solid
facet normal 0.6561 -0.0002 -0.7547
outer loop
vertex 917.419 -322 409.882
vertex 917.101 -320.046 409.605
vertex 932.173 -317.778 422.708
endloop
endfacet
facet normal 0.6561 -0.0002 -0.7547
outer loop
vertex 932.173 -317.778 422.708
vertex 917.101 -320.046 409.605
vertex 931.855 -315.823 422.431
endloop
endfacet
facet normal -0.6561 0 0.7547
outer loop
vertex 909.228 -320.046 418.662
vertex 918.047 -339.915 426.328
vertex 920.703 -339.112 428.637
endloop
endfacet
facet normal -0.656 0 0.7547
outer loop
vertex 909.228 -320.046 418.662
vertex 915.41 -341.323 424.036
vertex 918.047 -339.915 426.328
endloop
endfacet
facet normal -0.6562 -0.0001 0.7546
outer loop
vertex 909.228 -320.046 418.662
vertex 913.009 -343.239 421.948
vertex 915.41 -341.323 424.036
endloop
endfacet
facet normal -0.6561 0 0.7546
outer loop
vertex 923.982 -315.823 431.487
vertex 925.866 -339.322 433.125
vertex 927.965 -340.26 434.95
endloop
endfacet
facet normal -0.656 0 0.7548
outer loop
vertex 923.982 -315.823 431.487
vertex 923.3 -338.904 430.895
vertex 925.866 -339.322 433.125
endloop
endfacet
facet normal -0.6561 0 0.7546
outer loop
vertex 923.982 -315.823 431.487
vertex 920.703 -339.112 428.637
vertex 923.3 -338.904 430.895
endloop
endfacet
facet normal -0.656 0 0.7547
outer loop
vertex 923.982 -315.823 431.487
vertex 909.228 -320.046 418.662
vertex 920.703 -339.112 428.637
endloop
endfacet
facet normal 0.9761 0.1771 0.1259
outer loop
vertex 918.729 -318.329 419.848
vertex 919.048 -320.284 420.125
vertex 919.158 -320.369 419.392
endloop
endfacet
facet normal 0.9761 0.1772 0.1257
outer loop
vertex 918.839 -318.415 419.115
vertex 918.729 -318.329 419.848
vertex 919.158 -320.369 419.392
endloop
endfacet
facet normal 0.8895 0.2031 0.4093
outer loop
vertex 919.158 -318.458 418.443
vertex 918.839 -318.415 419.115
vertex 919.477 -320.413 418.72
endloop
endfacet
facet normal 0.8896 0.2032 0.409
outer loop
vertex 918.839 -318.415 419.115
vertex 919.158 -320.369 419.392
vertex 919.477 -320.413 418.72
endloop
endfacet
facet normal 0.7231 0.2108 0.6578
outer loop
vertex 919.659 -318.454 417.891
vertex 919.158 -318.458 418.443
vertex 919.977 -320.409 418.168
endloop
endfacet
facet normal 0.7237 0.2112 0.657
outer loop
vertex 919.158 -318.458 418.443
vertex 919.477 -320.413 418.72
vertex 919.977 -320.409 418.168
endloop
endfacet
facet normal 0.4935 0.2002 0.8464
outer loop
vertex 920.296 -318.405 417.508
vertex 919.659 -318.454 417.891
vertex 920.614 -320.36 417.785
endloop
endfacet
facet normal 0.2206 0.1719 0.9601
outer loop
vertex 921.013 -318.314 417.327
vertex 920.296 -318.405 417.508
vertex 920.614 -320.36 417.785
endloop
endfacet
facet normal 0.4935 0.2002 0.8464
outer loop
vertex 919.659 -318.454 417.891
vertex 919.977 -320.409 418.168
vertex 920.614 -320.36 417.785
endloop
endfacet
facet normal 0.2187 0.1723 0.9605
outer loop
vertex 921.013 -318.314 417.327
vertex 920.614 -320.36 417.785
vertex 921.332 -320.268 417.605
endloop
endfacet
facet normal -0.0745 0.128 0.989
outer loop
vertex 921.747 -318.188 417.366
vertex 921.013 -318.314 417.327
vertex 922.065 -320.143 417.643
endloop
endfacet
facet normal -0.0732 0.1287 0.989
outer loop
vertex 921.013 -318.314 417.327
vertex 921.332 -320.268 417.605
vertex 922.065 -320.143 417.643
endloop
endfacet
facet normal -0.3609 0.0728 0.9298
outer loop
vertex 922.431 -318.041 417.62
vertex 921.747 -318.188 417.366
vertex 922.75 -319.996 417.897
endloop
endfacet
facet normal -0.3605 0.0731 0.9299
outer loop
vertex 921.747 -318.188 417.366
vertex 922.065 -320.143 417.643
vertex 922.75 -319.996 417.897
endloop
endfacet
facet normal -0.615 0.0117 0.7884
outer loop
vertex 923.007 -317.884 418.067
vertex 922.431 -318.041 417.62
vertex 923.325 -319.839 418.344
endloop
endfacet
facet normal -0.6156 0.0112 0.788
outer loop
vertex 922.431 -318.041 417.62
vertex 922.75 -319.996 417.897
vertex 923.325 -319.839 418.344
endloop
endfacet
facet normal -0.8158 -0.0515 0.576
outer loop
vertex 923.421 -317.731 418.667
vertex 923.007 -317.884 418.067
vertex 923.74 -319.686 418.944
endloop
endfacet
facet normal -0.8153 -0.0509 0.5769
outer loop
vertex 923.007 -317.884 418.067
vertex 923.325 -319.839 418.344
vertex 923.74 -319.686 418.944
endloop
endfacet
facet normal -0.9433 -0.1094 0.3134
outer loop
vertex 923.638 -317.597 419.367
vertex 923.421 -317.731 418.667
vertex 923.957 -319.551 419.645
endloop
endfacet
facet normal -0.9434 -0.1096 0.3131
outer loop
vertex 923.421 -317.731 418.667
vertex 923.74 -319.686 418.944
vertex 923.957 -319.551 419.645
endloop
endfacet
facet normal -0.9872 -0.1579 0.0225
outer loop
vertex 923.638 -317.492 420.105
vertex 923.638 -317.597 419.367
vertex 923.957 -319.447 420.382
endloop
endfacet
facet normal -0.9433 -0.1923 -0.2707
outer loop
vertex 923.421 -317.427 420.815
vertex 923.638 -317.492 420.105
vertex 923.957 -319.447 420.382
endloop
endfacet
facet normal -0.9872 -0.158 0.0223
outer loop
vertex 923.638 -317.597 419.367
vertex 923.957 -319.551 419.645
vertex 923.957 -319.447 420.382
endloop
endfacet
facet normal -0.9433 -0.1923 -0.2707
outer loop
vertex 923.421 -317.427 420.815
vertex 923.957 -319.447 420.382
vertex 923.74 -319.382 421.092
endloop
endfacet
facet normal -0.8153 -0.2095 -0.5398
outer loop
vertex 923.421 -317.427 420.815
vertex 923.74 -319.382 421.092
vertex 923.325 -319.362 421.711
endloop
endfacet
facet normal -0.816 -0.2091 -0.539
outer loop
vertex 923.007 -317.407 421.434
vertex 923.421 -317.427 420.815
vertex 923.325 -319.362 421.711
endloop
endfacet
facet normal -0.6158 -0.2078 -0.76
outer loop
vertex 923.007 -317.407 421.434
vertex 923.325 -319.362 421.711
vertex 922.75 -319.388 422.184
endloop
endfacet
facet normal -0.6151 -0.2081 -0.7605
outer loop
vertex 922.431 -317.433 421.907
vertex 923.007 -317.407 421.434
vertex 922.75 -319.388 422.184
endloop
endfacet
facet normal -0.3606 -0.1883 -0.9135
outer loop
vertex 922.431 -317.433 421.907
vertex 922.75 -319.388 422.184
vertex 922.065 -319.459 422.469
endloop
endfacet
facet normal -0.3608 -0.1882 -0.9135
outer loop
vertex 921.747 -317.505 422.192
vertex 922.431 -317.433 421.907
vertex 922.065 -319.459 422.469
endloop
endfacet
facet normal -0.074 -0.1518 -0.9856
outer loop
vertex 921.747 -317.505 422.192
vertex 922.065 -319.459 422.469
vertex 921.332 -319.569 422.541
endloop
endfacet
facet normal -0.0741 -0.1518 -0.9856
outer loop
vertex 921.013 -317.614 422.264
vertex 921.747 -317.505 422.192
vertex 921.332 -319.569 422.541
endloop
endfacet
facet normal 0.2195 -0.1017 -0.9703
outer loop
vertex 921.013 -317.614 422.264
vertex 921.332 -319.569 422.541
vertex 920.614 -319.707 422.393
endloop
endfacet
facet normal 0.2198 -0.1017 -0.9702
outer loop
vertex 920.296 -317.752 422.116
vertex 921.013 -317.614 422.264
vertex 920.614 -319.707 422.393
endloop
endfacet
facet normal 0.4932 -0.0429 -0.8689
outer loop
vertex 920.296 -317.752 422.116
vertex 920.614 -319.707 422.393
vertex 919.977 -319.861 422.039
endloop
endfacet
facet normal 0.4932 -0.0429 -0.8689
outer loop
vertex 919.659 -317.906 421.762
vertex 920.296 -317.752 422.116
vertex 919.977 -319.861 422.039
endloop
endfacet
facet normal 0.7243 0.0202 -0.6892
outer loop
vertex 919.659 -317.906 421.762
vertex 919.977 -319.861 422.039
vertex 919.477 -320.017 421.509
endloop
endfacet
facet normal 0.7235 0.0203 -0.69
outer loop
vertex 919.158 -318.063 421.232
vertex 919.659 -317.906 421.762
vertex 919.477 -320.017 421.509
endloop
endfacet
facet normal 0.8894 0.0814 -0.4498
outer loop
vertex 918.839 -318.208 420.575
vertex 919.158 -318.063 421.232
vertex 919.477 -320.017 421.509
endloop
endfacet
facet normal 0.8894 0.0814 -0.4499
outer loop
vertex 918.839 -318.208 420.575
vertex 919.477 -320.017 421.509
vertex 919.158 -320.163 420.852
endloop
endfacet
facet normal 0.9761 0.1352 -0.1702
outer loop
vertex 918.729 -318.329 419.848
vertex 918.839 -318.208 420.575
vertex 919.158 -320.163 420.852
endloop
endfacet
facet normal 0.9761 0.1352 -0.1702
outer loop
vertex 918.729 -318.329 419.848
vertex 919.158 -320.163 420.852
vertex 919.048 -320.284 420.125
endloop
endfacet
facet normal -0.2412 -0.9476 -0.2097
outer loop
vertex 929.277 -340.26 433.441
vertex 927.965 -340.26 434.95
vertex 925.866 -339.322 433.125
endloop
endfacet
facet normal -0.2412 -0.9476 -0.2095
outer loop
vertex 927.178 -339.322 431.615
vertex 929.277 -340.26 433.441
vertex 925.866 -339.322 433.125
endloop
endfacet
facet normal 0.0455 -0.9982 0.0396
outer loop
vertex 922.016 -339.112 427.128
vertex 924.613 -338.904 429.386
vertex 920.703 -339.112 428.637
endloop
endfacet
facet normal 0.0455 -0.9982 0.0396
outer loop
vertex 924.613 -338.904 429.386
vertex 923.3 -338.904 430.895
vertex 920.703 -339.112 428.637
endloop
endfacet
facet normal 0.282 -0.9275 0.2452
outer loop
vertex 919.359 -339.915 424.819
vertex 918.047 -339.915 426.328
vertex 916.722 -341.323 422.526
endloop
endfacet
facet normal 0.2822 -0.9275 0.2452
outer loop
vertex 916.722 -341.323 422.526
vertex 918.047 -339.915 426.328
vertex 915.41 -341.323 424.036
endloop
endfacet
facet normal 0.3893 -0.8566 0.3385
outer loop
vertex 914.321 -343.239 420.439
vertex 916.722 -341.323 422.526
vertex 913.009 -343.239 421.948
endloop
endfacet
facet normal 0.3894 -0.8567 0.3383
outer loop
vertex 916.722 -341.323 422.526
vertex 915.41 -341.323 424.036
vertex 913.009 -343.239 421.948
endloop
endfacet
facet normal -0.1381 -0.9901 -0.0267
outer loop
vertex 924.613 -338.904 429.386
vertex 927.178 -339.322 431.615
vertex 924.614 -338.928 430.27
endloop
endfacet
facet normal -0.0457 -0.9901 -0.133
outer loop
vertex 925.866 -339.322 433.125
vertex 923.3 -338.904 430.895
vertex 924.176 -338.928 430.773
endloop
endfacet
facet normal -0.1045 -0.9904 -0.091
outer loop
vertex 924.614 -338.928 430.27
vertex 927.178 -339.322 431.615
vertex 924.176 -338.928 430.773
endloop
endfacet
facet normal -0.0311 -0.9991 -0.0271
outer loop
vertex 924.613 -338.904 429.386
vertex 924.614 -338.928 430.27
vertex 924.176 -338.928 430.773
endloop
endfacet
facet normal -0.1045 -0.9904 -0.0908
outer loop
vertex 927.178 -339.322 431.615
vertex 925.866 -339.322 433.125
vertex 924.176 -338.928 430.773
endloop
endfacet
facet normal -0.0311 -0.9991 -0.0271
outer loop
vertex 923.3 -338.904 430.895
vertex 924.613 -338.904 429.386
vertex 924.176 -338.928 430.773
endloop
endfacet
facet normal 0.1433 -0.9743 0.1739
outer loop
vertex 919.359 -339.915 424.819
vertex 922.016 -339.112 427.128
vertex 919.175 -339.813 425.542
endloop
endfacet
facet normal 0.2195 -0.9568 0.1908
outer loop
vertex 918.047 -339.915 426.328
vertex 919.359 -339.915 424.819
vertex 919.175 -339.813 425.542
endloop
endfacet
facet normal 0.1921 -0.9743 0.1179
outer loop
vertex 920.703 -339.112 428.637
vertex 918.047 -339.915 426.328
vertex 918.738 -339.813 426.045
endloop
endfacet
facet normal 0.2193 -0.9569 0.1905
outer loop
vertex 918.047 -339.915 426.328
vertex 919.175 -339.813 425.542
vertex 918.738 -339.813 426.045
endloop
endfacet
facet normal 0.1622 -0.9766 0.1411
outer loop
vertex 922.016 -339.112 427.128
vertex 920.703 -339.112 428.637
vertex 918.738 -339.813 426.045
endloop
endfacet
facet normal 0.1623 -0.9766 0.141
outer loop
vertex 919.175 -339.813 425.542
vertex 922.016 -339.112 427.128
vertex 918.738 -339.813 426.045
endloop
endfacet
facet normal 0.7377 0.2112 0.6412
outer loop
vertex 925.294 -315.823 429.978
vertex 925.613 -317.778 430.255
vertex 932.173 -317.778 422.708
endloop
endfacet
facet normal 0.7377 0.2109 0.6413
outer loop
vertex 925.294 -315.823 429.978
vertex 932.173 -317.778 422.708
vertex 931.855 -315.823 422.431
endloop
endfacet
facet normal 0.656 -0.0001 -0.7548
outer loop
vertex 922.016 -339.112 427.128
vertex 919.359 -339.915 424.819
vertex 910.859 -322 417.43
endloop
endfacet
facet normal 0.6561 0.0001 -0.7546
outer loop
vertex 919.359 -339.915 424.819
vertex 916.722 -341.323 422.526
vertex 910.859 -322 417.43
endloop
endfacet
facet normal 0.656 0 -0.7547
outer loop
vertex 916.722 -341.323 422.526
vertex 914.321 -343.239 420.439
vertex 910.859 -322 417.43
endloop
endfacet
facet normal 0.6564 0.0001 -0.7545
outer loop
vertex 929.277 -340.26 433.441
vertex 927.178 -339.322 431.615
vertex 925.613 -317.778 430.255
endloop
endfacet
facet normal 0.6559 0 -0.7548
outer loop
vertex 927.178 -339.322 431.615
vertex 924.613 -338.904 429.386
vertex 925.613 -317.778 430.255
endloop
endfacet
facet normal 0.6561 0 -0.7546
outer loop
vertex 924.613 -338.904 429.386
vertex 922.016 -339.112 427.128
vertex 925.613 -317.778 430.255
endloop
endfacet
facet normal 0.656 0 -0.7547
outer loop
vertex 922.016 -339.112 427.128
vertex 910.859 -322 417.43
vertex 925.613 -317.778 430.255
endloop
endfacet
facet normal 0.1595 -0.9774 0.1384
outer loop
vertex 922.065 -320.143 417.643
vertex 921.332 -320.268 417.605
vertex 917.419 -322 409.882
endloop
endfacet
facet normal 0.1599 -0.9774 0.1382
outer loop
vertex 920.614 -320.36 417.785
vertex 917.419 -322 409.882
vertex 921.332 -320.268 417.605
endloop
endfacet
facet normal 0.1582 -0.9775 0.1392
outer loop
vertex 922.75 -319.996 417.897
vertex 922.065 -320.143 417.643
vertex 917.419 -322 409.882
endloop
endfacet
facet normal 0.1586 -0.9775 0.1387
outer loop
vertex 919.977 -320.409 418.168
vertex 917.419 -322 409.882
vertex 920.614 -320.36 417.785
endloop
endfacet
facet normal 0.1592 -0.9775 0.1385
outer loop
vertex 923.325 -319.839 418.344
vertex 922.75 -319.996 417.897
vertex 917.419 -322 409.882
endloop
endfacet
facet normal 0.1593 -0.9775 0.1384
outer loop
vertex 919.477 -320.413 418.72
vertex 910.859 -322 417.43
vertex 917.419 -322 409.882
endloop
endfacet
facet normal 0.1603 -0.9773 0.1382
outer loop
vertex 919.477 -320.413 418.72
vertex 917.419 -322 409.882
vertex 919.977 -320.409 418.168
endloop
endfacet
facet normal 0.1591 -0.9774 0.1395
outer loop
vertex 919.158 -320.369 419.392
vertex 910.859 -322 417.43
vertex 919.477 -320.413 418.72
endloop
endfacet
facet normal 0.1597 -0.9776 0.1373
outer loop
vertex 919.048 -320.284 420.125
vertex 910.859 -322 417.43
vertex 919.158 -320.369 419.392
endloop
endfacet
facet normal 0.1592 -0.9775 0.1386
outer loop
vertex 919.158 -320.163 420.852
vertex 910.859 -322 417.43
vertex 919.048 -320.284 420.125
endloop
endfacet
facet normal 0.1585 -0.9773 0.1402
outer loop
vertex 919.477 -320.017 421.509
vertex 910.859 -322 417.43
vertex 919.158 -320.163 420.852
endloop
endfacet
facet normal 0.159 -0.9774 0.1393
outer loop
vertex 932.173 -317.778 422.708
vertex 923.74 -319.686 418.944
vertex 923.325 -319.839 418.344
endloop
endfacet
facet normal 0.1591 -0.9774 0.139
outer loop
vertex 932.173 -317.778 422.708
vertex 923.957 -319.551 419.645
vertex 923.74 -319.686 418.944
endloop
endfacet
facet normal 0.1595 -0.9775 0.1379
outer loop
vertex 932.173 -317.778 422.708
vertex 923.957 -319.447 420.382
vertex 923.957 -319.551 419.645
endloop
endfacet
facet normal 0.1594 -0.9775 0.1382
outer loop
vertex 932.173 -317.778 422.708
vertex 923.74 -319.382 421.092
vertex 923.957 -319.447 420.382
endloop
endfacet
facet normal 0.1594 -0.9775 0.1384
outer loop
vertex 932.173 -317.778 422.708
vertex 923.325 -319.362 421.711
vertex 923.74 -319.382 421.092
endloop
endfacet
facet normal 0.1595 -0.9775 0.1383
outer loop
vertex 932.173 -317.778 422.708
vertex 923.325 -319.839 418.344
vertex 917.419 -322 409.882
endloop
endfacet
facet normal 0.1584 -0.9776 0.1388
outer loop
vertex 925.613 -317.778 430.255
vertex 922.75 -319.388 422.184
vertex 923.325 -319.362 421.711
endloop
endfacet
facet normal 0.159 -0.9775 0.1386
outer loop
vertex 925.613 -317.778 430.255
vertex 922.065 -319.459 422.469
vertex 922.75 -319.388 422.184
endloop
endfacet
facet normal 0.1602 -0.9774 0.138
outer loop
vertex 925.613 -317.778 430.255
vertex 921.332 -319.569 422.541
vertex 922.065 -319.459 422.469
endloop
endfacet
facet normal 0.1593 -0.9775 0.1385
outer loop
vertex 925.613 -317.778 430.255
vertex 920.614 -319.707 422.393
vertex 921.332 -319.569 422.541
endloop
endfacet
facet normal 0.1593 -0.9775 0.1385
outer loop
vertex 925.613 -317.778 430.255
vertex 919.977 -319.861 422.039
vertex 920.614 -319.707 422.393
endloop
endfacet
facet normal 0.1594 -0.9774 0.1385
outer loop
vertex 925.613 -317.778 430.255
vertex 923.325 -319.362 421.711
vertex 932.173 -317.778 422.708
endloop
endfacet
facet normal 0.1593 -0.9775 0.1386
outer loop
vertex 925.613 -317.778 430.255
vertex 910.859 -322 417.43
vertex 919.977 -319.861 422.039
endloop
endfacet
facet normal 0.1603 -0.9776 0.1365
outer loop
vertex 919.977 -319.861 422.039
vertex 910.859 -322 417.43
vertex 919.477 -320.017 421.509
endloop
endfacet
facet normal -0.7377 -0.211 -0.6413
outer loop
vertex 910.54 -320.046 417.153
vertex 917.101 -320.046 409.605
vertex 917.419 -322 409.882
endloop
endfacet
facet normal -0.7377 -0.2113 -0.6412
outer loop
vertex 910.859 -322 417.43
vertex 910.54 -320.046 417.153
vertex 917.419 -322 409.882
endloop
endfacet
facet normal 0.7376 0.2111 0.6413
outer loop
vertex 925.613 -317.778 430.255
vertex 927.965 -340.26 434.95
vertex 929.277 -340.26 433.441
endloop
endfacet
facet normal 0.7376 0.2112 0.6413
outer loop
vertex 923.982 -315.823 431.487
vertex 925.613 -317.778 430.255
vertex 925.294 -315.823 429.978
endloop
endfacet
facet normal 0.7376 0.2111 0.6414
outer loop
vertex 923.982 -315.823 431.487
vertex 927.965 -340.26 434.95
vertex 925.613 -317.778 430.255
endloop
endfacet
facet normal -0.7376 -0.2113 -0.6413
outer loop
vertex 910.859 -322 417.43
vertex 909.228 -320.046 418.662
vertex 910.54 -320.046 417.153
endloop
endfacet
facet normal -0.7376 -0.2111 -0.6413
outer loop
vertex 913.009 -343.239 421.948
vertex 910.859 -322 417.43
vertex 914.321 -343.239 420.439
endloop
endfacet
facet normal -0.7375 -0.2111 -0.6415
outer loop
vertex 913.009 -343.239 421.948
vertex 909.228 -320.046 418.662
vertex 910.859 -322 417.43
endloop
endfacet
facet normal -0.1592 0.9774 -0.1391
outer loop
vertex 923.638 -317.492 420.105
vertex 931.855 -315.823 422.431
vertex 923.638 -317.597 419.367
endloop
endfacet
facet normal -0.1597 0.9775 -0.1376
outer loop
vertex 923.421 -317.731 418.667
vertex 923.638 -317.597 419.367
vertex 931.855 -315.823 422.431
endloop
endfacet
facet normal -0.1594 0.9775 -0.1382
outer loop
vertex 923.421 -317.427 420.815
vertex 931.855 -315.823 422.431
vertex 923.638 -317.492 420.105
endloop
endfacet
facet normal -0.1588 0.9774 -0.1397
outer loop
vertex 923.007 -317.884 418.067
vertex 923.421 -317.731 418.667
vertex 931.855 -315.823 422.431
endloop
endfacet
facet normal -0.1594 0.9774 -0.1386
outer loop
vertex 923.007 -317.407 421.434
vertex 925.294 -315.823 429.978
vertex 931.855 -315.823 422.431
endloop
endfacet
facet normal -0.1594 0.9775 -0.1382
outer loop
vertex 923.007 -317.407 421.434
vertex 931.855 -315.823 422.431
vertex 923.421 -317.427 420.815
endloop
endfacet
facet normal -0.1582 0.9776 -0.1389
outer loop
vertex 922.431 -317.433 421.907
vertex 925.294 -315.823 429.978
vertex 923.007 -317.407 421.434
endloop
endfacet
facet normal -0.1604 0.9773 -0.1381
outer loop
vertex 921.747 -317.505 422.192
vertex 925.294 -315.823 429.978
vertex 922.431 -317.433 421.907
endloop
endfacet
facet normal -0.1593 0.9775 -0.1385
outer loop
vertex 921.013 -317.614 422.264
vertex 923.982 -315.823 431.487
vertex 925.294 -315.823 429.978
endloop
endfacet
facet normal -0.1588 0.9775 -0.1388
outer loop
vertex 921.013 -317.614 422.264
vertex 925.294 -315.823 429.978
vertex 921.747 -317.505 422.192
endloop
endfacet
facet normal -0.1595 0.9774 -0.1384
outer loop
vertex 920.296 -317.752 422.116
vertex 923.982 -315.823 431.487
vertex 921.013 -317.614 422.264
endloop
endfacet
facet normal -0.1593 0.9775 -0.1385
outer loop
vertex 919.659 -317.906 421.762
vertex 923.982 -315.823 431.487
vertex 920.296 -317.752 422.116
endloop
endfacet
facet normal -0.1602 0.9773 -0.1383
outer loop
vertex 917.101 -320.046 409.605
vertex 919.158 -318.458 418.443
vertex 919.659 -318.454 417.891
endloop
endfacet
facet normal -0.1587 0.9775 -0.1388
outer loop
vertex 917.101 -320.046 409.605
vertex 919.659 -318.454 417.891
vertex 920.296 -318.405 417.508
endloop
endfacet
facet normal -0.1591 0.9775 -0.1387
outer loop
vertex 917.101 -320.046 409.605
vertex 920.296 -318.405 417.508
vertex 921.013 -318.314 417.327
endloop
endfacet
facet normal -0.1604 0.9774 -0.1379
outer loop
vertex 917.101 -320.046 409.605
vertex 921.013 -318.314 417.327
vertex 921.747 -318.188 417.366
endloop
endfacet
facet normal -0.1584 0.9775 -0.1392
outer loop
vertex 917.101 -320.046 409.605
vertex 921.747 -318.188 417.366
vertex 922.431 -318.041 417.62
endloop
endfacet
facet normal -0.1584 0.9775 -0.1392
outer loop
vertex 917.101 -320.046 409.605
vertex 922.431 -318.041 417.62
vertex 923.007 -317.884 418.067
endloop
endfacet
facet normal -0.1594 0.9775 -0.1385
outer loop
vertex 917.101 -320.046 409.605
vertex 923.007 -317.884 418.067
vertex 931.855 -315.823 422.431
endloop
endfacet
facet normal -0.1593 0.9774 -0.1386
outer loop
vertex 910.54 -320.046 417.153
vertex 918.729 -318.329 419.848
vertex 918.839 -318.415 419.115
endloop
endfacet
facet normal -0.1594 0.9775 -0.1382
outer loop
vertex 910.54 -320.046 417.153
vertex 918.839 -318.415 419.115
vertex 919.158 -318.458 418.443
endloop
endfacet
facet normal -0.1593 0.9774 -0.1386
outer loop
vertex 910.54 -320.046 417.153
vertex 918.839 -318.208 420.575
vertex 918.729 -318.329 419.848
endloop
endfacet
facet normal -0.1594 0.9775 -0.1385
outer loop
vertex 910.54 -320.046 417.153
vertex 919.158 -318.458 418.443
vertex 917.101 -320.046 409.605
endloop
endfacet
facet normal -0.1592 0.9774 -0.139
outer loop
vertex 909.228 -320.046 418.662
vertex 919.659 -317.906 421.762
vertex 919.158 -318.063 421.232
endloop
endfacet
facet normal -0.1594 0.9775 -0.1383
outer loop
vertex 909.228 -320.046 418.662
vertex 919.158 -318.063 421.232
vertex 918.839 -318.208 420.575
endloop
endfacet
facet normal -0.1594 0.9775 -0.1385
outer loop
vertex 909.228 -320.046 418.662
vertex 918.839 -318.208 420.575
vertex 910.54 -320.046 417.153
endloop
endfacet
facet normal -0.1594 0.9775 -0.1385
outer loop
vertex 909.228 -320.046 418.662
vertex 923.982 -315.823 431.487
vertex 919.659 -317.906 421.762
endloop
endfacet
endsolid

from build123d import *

# Parameters (mm, degrees)
DODANIE_WYCI_GNI_CIE1_DEPTH       = 2
WYCI_GNI_CIE_CIENKA_CIANKA1_DEPTH = 10
SZKIC3_R                          = 2.5
WYTNIJ_WYCI_GNI_CIE1_DEPTH        = 10


with BuildPart() as part:
    # Szkic1 → Dodanie-wyciągnięcie1 (new body)
    with BuildSketch(Plane(origin=(184.050171811, 0, -211.725502995), x_dir=(-0.75470958, 0, -0.656059029), z_dir=(0.656059029, 0, -0.75470958))):
        with BuildLine():
            Line((-985.697252828, -340.259541181), (-980.419174897, -315.823054253))
            Line((-980.419174897, -315.823054253), (-960.869985355, -320.045516598))
            Line((-960.869985355, -320.045516598), (-965.879501286, -343.238613058))
            add(Edge.make_bspline(
                [(-985.697252828, -340.259541181), (-980.093985624, -337.678026431), (-972.488962975, -338.490376385), (-965.879501286, -343.238613058)],
                knots=[0.113652907, 0.113652907, 0.113652907, 0.113652907, 0.285976573, 0.285976573, 0.285976573, 0.285976573], degree=3, weights=[0.648724237, 0.52341314, 0.477289897, 0.510354511]))
        make_face()
    extrude(amount=DODANIE_WYCI_GNI_CIE1_DEPTH)

    # Szkic2 → Wyciągnięcie-cienka ścianka1 (add)
    with BuildSketch(Plane(origin=(185.362289869, 0, -213.234922155), x_dir=(-0.75470958, 0, -0.656059029), z_dir=(0.656059029, 0, -0.75470958))):
        Polygon((-980.419174897, -315.823054253), (-960.869985355, -320.045516598), (-961.292231589, -322.000435553), (-980.841421131, -317.777973208), align=None)
    extrude(amount=WYCI_GNI_CIE_CIENKA_CIANKA1_DEPTH)

    # Szkic3 → Wytnij-wyciągnięcie1 (cut)
    with BuildSketch(Plane(origin=(82.487524873, -506.024310162, 71.705311407), x_dir=(-0.987224309, -0.157760609, 0.022355198), z_dir=(0.159336639, -0.977459477, 0.138509227))):
        with Locations((-849.886383223, -371.032714173)):
            Circle(SZKIC3_R)
    extrude(amount=-WYTNIJ_WYCI_GNI_CIE1_DEPTH, mode=Mode.SUBTRACT)


solid = part.part
